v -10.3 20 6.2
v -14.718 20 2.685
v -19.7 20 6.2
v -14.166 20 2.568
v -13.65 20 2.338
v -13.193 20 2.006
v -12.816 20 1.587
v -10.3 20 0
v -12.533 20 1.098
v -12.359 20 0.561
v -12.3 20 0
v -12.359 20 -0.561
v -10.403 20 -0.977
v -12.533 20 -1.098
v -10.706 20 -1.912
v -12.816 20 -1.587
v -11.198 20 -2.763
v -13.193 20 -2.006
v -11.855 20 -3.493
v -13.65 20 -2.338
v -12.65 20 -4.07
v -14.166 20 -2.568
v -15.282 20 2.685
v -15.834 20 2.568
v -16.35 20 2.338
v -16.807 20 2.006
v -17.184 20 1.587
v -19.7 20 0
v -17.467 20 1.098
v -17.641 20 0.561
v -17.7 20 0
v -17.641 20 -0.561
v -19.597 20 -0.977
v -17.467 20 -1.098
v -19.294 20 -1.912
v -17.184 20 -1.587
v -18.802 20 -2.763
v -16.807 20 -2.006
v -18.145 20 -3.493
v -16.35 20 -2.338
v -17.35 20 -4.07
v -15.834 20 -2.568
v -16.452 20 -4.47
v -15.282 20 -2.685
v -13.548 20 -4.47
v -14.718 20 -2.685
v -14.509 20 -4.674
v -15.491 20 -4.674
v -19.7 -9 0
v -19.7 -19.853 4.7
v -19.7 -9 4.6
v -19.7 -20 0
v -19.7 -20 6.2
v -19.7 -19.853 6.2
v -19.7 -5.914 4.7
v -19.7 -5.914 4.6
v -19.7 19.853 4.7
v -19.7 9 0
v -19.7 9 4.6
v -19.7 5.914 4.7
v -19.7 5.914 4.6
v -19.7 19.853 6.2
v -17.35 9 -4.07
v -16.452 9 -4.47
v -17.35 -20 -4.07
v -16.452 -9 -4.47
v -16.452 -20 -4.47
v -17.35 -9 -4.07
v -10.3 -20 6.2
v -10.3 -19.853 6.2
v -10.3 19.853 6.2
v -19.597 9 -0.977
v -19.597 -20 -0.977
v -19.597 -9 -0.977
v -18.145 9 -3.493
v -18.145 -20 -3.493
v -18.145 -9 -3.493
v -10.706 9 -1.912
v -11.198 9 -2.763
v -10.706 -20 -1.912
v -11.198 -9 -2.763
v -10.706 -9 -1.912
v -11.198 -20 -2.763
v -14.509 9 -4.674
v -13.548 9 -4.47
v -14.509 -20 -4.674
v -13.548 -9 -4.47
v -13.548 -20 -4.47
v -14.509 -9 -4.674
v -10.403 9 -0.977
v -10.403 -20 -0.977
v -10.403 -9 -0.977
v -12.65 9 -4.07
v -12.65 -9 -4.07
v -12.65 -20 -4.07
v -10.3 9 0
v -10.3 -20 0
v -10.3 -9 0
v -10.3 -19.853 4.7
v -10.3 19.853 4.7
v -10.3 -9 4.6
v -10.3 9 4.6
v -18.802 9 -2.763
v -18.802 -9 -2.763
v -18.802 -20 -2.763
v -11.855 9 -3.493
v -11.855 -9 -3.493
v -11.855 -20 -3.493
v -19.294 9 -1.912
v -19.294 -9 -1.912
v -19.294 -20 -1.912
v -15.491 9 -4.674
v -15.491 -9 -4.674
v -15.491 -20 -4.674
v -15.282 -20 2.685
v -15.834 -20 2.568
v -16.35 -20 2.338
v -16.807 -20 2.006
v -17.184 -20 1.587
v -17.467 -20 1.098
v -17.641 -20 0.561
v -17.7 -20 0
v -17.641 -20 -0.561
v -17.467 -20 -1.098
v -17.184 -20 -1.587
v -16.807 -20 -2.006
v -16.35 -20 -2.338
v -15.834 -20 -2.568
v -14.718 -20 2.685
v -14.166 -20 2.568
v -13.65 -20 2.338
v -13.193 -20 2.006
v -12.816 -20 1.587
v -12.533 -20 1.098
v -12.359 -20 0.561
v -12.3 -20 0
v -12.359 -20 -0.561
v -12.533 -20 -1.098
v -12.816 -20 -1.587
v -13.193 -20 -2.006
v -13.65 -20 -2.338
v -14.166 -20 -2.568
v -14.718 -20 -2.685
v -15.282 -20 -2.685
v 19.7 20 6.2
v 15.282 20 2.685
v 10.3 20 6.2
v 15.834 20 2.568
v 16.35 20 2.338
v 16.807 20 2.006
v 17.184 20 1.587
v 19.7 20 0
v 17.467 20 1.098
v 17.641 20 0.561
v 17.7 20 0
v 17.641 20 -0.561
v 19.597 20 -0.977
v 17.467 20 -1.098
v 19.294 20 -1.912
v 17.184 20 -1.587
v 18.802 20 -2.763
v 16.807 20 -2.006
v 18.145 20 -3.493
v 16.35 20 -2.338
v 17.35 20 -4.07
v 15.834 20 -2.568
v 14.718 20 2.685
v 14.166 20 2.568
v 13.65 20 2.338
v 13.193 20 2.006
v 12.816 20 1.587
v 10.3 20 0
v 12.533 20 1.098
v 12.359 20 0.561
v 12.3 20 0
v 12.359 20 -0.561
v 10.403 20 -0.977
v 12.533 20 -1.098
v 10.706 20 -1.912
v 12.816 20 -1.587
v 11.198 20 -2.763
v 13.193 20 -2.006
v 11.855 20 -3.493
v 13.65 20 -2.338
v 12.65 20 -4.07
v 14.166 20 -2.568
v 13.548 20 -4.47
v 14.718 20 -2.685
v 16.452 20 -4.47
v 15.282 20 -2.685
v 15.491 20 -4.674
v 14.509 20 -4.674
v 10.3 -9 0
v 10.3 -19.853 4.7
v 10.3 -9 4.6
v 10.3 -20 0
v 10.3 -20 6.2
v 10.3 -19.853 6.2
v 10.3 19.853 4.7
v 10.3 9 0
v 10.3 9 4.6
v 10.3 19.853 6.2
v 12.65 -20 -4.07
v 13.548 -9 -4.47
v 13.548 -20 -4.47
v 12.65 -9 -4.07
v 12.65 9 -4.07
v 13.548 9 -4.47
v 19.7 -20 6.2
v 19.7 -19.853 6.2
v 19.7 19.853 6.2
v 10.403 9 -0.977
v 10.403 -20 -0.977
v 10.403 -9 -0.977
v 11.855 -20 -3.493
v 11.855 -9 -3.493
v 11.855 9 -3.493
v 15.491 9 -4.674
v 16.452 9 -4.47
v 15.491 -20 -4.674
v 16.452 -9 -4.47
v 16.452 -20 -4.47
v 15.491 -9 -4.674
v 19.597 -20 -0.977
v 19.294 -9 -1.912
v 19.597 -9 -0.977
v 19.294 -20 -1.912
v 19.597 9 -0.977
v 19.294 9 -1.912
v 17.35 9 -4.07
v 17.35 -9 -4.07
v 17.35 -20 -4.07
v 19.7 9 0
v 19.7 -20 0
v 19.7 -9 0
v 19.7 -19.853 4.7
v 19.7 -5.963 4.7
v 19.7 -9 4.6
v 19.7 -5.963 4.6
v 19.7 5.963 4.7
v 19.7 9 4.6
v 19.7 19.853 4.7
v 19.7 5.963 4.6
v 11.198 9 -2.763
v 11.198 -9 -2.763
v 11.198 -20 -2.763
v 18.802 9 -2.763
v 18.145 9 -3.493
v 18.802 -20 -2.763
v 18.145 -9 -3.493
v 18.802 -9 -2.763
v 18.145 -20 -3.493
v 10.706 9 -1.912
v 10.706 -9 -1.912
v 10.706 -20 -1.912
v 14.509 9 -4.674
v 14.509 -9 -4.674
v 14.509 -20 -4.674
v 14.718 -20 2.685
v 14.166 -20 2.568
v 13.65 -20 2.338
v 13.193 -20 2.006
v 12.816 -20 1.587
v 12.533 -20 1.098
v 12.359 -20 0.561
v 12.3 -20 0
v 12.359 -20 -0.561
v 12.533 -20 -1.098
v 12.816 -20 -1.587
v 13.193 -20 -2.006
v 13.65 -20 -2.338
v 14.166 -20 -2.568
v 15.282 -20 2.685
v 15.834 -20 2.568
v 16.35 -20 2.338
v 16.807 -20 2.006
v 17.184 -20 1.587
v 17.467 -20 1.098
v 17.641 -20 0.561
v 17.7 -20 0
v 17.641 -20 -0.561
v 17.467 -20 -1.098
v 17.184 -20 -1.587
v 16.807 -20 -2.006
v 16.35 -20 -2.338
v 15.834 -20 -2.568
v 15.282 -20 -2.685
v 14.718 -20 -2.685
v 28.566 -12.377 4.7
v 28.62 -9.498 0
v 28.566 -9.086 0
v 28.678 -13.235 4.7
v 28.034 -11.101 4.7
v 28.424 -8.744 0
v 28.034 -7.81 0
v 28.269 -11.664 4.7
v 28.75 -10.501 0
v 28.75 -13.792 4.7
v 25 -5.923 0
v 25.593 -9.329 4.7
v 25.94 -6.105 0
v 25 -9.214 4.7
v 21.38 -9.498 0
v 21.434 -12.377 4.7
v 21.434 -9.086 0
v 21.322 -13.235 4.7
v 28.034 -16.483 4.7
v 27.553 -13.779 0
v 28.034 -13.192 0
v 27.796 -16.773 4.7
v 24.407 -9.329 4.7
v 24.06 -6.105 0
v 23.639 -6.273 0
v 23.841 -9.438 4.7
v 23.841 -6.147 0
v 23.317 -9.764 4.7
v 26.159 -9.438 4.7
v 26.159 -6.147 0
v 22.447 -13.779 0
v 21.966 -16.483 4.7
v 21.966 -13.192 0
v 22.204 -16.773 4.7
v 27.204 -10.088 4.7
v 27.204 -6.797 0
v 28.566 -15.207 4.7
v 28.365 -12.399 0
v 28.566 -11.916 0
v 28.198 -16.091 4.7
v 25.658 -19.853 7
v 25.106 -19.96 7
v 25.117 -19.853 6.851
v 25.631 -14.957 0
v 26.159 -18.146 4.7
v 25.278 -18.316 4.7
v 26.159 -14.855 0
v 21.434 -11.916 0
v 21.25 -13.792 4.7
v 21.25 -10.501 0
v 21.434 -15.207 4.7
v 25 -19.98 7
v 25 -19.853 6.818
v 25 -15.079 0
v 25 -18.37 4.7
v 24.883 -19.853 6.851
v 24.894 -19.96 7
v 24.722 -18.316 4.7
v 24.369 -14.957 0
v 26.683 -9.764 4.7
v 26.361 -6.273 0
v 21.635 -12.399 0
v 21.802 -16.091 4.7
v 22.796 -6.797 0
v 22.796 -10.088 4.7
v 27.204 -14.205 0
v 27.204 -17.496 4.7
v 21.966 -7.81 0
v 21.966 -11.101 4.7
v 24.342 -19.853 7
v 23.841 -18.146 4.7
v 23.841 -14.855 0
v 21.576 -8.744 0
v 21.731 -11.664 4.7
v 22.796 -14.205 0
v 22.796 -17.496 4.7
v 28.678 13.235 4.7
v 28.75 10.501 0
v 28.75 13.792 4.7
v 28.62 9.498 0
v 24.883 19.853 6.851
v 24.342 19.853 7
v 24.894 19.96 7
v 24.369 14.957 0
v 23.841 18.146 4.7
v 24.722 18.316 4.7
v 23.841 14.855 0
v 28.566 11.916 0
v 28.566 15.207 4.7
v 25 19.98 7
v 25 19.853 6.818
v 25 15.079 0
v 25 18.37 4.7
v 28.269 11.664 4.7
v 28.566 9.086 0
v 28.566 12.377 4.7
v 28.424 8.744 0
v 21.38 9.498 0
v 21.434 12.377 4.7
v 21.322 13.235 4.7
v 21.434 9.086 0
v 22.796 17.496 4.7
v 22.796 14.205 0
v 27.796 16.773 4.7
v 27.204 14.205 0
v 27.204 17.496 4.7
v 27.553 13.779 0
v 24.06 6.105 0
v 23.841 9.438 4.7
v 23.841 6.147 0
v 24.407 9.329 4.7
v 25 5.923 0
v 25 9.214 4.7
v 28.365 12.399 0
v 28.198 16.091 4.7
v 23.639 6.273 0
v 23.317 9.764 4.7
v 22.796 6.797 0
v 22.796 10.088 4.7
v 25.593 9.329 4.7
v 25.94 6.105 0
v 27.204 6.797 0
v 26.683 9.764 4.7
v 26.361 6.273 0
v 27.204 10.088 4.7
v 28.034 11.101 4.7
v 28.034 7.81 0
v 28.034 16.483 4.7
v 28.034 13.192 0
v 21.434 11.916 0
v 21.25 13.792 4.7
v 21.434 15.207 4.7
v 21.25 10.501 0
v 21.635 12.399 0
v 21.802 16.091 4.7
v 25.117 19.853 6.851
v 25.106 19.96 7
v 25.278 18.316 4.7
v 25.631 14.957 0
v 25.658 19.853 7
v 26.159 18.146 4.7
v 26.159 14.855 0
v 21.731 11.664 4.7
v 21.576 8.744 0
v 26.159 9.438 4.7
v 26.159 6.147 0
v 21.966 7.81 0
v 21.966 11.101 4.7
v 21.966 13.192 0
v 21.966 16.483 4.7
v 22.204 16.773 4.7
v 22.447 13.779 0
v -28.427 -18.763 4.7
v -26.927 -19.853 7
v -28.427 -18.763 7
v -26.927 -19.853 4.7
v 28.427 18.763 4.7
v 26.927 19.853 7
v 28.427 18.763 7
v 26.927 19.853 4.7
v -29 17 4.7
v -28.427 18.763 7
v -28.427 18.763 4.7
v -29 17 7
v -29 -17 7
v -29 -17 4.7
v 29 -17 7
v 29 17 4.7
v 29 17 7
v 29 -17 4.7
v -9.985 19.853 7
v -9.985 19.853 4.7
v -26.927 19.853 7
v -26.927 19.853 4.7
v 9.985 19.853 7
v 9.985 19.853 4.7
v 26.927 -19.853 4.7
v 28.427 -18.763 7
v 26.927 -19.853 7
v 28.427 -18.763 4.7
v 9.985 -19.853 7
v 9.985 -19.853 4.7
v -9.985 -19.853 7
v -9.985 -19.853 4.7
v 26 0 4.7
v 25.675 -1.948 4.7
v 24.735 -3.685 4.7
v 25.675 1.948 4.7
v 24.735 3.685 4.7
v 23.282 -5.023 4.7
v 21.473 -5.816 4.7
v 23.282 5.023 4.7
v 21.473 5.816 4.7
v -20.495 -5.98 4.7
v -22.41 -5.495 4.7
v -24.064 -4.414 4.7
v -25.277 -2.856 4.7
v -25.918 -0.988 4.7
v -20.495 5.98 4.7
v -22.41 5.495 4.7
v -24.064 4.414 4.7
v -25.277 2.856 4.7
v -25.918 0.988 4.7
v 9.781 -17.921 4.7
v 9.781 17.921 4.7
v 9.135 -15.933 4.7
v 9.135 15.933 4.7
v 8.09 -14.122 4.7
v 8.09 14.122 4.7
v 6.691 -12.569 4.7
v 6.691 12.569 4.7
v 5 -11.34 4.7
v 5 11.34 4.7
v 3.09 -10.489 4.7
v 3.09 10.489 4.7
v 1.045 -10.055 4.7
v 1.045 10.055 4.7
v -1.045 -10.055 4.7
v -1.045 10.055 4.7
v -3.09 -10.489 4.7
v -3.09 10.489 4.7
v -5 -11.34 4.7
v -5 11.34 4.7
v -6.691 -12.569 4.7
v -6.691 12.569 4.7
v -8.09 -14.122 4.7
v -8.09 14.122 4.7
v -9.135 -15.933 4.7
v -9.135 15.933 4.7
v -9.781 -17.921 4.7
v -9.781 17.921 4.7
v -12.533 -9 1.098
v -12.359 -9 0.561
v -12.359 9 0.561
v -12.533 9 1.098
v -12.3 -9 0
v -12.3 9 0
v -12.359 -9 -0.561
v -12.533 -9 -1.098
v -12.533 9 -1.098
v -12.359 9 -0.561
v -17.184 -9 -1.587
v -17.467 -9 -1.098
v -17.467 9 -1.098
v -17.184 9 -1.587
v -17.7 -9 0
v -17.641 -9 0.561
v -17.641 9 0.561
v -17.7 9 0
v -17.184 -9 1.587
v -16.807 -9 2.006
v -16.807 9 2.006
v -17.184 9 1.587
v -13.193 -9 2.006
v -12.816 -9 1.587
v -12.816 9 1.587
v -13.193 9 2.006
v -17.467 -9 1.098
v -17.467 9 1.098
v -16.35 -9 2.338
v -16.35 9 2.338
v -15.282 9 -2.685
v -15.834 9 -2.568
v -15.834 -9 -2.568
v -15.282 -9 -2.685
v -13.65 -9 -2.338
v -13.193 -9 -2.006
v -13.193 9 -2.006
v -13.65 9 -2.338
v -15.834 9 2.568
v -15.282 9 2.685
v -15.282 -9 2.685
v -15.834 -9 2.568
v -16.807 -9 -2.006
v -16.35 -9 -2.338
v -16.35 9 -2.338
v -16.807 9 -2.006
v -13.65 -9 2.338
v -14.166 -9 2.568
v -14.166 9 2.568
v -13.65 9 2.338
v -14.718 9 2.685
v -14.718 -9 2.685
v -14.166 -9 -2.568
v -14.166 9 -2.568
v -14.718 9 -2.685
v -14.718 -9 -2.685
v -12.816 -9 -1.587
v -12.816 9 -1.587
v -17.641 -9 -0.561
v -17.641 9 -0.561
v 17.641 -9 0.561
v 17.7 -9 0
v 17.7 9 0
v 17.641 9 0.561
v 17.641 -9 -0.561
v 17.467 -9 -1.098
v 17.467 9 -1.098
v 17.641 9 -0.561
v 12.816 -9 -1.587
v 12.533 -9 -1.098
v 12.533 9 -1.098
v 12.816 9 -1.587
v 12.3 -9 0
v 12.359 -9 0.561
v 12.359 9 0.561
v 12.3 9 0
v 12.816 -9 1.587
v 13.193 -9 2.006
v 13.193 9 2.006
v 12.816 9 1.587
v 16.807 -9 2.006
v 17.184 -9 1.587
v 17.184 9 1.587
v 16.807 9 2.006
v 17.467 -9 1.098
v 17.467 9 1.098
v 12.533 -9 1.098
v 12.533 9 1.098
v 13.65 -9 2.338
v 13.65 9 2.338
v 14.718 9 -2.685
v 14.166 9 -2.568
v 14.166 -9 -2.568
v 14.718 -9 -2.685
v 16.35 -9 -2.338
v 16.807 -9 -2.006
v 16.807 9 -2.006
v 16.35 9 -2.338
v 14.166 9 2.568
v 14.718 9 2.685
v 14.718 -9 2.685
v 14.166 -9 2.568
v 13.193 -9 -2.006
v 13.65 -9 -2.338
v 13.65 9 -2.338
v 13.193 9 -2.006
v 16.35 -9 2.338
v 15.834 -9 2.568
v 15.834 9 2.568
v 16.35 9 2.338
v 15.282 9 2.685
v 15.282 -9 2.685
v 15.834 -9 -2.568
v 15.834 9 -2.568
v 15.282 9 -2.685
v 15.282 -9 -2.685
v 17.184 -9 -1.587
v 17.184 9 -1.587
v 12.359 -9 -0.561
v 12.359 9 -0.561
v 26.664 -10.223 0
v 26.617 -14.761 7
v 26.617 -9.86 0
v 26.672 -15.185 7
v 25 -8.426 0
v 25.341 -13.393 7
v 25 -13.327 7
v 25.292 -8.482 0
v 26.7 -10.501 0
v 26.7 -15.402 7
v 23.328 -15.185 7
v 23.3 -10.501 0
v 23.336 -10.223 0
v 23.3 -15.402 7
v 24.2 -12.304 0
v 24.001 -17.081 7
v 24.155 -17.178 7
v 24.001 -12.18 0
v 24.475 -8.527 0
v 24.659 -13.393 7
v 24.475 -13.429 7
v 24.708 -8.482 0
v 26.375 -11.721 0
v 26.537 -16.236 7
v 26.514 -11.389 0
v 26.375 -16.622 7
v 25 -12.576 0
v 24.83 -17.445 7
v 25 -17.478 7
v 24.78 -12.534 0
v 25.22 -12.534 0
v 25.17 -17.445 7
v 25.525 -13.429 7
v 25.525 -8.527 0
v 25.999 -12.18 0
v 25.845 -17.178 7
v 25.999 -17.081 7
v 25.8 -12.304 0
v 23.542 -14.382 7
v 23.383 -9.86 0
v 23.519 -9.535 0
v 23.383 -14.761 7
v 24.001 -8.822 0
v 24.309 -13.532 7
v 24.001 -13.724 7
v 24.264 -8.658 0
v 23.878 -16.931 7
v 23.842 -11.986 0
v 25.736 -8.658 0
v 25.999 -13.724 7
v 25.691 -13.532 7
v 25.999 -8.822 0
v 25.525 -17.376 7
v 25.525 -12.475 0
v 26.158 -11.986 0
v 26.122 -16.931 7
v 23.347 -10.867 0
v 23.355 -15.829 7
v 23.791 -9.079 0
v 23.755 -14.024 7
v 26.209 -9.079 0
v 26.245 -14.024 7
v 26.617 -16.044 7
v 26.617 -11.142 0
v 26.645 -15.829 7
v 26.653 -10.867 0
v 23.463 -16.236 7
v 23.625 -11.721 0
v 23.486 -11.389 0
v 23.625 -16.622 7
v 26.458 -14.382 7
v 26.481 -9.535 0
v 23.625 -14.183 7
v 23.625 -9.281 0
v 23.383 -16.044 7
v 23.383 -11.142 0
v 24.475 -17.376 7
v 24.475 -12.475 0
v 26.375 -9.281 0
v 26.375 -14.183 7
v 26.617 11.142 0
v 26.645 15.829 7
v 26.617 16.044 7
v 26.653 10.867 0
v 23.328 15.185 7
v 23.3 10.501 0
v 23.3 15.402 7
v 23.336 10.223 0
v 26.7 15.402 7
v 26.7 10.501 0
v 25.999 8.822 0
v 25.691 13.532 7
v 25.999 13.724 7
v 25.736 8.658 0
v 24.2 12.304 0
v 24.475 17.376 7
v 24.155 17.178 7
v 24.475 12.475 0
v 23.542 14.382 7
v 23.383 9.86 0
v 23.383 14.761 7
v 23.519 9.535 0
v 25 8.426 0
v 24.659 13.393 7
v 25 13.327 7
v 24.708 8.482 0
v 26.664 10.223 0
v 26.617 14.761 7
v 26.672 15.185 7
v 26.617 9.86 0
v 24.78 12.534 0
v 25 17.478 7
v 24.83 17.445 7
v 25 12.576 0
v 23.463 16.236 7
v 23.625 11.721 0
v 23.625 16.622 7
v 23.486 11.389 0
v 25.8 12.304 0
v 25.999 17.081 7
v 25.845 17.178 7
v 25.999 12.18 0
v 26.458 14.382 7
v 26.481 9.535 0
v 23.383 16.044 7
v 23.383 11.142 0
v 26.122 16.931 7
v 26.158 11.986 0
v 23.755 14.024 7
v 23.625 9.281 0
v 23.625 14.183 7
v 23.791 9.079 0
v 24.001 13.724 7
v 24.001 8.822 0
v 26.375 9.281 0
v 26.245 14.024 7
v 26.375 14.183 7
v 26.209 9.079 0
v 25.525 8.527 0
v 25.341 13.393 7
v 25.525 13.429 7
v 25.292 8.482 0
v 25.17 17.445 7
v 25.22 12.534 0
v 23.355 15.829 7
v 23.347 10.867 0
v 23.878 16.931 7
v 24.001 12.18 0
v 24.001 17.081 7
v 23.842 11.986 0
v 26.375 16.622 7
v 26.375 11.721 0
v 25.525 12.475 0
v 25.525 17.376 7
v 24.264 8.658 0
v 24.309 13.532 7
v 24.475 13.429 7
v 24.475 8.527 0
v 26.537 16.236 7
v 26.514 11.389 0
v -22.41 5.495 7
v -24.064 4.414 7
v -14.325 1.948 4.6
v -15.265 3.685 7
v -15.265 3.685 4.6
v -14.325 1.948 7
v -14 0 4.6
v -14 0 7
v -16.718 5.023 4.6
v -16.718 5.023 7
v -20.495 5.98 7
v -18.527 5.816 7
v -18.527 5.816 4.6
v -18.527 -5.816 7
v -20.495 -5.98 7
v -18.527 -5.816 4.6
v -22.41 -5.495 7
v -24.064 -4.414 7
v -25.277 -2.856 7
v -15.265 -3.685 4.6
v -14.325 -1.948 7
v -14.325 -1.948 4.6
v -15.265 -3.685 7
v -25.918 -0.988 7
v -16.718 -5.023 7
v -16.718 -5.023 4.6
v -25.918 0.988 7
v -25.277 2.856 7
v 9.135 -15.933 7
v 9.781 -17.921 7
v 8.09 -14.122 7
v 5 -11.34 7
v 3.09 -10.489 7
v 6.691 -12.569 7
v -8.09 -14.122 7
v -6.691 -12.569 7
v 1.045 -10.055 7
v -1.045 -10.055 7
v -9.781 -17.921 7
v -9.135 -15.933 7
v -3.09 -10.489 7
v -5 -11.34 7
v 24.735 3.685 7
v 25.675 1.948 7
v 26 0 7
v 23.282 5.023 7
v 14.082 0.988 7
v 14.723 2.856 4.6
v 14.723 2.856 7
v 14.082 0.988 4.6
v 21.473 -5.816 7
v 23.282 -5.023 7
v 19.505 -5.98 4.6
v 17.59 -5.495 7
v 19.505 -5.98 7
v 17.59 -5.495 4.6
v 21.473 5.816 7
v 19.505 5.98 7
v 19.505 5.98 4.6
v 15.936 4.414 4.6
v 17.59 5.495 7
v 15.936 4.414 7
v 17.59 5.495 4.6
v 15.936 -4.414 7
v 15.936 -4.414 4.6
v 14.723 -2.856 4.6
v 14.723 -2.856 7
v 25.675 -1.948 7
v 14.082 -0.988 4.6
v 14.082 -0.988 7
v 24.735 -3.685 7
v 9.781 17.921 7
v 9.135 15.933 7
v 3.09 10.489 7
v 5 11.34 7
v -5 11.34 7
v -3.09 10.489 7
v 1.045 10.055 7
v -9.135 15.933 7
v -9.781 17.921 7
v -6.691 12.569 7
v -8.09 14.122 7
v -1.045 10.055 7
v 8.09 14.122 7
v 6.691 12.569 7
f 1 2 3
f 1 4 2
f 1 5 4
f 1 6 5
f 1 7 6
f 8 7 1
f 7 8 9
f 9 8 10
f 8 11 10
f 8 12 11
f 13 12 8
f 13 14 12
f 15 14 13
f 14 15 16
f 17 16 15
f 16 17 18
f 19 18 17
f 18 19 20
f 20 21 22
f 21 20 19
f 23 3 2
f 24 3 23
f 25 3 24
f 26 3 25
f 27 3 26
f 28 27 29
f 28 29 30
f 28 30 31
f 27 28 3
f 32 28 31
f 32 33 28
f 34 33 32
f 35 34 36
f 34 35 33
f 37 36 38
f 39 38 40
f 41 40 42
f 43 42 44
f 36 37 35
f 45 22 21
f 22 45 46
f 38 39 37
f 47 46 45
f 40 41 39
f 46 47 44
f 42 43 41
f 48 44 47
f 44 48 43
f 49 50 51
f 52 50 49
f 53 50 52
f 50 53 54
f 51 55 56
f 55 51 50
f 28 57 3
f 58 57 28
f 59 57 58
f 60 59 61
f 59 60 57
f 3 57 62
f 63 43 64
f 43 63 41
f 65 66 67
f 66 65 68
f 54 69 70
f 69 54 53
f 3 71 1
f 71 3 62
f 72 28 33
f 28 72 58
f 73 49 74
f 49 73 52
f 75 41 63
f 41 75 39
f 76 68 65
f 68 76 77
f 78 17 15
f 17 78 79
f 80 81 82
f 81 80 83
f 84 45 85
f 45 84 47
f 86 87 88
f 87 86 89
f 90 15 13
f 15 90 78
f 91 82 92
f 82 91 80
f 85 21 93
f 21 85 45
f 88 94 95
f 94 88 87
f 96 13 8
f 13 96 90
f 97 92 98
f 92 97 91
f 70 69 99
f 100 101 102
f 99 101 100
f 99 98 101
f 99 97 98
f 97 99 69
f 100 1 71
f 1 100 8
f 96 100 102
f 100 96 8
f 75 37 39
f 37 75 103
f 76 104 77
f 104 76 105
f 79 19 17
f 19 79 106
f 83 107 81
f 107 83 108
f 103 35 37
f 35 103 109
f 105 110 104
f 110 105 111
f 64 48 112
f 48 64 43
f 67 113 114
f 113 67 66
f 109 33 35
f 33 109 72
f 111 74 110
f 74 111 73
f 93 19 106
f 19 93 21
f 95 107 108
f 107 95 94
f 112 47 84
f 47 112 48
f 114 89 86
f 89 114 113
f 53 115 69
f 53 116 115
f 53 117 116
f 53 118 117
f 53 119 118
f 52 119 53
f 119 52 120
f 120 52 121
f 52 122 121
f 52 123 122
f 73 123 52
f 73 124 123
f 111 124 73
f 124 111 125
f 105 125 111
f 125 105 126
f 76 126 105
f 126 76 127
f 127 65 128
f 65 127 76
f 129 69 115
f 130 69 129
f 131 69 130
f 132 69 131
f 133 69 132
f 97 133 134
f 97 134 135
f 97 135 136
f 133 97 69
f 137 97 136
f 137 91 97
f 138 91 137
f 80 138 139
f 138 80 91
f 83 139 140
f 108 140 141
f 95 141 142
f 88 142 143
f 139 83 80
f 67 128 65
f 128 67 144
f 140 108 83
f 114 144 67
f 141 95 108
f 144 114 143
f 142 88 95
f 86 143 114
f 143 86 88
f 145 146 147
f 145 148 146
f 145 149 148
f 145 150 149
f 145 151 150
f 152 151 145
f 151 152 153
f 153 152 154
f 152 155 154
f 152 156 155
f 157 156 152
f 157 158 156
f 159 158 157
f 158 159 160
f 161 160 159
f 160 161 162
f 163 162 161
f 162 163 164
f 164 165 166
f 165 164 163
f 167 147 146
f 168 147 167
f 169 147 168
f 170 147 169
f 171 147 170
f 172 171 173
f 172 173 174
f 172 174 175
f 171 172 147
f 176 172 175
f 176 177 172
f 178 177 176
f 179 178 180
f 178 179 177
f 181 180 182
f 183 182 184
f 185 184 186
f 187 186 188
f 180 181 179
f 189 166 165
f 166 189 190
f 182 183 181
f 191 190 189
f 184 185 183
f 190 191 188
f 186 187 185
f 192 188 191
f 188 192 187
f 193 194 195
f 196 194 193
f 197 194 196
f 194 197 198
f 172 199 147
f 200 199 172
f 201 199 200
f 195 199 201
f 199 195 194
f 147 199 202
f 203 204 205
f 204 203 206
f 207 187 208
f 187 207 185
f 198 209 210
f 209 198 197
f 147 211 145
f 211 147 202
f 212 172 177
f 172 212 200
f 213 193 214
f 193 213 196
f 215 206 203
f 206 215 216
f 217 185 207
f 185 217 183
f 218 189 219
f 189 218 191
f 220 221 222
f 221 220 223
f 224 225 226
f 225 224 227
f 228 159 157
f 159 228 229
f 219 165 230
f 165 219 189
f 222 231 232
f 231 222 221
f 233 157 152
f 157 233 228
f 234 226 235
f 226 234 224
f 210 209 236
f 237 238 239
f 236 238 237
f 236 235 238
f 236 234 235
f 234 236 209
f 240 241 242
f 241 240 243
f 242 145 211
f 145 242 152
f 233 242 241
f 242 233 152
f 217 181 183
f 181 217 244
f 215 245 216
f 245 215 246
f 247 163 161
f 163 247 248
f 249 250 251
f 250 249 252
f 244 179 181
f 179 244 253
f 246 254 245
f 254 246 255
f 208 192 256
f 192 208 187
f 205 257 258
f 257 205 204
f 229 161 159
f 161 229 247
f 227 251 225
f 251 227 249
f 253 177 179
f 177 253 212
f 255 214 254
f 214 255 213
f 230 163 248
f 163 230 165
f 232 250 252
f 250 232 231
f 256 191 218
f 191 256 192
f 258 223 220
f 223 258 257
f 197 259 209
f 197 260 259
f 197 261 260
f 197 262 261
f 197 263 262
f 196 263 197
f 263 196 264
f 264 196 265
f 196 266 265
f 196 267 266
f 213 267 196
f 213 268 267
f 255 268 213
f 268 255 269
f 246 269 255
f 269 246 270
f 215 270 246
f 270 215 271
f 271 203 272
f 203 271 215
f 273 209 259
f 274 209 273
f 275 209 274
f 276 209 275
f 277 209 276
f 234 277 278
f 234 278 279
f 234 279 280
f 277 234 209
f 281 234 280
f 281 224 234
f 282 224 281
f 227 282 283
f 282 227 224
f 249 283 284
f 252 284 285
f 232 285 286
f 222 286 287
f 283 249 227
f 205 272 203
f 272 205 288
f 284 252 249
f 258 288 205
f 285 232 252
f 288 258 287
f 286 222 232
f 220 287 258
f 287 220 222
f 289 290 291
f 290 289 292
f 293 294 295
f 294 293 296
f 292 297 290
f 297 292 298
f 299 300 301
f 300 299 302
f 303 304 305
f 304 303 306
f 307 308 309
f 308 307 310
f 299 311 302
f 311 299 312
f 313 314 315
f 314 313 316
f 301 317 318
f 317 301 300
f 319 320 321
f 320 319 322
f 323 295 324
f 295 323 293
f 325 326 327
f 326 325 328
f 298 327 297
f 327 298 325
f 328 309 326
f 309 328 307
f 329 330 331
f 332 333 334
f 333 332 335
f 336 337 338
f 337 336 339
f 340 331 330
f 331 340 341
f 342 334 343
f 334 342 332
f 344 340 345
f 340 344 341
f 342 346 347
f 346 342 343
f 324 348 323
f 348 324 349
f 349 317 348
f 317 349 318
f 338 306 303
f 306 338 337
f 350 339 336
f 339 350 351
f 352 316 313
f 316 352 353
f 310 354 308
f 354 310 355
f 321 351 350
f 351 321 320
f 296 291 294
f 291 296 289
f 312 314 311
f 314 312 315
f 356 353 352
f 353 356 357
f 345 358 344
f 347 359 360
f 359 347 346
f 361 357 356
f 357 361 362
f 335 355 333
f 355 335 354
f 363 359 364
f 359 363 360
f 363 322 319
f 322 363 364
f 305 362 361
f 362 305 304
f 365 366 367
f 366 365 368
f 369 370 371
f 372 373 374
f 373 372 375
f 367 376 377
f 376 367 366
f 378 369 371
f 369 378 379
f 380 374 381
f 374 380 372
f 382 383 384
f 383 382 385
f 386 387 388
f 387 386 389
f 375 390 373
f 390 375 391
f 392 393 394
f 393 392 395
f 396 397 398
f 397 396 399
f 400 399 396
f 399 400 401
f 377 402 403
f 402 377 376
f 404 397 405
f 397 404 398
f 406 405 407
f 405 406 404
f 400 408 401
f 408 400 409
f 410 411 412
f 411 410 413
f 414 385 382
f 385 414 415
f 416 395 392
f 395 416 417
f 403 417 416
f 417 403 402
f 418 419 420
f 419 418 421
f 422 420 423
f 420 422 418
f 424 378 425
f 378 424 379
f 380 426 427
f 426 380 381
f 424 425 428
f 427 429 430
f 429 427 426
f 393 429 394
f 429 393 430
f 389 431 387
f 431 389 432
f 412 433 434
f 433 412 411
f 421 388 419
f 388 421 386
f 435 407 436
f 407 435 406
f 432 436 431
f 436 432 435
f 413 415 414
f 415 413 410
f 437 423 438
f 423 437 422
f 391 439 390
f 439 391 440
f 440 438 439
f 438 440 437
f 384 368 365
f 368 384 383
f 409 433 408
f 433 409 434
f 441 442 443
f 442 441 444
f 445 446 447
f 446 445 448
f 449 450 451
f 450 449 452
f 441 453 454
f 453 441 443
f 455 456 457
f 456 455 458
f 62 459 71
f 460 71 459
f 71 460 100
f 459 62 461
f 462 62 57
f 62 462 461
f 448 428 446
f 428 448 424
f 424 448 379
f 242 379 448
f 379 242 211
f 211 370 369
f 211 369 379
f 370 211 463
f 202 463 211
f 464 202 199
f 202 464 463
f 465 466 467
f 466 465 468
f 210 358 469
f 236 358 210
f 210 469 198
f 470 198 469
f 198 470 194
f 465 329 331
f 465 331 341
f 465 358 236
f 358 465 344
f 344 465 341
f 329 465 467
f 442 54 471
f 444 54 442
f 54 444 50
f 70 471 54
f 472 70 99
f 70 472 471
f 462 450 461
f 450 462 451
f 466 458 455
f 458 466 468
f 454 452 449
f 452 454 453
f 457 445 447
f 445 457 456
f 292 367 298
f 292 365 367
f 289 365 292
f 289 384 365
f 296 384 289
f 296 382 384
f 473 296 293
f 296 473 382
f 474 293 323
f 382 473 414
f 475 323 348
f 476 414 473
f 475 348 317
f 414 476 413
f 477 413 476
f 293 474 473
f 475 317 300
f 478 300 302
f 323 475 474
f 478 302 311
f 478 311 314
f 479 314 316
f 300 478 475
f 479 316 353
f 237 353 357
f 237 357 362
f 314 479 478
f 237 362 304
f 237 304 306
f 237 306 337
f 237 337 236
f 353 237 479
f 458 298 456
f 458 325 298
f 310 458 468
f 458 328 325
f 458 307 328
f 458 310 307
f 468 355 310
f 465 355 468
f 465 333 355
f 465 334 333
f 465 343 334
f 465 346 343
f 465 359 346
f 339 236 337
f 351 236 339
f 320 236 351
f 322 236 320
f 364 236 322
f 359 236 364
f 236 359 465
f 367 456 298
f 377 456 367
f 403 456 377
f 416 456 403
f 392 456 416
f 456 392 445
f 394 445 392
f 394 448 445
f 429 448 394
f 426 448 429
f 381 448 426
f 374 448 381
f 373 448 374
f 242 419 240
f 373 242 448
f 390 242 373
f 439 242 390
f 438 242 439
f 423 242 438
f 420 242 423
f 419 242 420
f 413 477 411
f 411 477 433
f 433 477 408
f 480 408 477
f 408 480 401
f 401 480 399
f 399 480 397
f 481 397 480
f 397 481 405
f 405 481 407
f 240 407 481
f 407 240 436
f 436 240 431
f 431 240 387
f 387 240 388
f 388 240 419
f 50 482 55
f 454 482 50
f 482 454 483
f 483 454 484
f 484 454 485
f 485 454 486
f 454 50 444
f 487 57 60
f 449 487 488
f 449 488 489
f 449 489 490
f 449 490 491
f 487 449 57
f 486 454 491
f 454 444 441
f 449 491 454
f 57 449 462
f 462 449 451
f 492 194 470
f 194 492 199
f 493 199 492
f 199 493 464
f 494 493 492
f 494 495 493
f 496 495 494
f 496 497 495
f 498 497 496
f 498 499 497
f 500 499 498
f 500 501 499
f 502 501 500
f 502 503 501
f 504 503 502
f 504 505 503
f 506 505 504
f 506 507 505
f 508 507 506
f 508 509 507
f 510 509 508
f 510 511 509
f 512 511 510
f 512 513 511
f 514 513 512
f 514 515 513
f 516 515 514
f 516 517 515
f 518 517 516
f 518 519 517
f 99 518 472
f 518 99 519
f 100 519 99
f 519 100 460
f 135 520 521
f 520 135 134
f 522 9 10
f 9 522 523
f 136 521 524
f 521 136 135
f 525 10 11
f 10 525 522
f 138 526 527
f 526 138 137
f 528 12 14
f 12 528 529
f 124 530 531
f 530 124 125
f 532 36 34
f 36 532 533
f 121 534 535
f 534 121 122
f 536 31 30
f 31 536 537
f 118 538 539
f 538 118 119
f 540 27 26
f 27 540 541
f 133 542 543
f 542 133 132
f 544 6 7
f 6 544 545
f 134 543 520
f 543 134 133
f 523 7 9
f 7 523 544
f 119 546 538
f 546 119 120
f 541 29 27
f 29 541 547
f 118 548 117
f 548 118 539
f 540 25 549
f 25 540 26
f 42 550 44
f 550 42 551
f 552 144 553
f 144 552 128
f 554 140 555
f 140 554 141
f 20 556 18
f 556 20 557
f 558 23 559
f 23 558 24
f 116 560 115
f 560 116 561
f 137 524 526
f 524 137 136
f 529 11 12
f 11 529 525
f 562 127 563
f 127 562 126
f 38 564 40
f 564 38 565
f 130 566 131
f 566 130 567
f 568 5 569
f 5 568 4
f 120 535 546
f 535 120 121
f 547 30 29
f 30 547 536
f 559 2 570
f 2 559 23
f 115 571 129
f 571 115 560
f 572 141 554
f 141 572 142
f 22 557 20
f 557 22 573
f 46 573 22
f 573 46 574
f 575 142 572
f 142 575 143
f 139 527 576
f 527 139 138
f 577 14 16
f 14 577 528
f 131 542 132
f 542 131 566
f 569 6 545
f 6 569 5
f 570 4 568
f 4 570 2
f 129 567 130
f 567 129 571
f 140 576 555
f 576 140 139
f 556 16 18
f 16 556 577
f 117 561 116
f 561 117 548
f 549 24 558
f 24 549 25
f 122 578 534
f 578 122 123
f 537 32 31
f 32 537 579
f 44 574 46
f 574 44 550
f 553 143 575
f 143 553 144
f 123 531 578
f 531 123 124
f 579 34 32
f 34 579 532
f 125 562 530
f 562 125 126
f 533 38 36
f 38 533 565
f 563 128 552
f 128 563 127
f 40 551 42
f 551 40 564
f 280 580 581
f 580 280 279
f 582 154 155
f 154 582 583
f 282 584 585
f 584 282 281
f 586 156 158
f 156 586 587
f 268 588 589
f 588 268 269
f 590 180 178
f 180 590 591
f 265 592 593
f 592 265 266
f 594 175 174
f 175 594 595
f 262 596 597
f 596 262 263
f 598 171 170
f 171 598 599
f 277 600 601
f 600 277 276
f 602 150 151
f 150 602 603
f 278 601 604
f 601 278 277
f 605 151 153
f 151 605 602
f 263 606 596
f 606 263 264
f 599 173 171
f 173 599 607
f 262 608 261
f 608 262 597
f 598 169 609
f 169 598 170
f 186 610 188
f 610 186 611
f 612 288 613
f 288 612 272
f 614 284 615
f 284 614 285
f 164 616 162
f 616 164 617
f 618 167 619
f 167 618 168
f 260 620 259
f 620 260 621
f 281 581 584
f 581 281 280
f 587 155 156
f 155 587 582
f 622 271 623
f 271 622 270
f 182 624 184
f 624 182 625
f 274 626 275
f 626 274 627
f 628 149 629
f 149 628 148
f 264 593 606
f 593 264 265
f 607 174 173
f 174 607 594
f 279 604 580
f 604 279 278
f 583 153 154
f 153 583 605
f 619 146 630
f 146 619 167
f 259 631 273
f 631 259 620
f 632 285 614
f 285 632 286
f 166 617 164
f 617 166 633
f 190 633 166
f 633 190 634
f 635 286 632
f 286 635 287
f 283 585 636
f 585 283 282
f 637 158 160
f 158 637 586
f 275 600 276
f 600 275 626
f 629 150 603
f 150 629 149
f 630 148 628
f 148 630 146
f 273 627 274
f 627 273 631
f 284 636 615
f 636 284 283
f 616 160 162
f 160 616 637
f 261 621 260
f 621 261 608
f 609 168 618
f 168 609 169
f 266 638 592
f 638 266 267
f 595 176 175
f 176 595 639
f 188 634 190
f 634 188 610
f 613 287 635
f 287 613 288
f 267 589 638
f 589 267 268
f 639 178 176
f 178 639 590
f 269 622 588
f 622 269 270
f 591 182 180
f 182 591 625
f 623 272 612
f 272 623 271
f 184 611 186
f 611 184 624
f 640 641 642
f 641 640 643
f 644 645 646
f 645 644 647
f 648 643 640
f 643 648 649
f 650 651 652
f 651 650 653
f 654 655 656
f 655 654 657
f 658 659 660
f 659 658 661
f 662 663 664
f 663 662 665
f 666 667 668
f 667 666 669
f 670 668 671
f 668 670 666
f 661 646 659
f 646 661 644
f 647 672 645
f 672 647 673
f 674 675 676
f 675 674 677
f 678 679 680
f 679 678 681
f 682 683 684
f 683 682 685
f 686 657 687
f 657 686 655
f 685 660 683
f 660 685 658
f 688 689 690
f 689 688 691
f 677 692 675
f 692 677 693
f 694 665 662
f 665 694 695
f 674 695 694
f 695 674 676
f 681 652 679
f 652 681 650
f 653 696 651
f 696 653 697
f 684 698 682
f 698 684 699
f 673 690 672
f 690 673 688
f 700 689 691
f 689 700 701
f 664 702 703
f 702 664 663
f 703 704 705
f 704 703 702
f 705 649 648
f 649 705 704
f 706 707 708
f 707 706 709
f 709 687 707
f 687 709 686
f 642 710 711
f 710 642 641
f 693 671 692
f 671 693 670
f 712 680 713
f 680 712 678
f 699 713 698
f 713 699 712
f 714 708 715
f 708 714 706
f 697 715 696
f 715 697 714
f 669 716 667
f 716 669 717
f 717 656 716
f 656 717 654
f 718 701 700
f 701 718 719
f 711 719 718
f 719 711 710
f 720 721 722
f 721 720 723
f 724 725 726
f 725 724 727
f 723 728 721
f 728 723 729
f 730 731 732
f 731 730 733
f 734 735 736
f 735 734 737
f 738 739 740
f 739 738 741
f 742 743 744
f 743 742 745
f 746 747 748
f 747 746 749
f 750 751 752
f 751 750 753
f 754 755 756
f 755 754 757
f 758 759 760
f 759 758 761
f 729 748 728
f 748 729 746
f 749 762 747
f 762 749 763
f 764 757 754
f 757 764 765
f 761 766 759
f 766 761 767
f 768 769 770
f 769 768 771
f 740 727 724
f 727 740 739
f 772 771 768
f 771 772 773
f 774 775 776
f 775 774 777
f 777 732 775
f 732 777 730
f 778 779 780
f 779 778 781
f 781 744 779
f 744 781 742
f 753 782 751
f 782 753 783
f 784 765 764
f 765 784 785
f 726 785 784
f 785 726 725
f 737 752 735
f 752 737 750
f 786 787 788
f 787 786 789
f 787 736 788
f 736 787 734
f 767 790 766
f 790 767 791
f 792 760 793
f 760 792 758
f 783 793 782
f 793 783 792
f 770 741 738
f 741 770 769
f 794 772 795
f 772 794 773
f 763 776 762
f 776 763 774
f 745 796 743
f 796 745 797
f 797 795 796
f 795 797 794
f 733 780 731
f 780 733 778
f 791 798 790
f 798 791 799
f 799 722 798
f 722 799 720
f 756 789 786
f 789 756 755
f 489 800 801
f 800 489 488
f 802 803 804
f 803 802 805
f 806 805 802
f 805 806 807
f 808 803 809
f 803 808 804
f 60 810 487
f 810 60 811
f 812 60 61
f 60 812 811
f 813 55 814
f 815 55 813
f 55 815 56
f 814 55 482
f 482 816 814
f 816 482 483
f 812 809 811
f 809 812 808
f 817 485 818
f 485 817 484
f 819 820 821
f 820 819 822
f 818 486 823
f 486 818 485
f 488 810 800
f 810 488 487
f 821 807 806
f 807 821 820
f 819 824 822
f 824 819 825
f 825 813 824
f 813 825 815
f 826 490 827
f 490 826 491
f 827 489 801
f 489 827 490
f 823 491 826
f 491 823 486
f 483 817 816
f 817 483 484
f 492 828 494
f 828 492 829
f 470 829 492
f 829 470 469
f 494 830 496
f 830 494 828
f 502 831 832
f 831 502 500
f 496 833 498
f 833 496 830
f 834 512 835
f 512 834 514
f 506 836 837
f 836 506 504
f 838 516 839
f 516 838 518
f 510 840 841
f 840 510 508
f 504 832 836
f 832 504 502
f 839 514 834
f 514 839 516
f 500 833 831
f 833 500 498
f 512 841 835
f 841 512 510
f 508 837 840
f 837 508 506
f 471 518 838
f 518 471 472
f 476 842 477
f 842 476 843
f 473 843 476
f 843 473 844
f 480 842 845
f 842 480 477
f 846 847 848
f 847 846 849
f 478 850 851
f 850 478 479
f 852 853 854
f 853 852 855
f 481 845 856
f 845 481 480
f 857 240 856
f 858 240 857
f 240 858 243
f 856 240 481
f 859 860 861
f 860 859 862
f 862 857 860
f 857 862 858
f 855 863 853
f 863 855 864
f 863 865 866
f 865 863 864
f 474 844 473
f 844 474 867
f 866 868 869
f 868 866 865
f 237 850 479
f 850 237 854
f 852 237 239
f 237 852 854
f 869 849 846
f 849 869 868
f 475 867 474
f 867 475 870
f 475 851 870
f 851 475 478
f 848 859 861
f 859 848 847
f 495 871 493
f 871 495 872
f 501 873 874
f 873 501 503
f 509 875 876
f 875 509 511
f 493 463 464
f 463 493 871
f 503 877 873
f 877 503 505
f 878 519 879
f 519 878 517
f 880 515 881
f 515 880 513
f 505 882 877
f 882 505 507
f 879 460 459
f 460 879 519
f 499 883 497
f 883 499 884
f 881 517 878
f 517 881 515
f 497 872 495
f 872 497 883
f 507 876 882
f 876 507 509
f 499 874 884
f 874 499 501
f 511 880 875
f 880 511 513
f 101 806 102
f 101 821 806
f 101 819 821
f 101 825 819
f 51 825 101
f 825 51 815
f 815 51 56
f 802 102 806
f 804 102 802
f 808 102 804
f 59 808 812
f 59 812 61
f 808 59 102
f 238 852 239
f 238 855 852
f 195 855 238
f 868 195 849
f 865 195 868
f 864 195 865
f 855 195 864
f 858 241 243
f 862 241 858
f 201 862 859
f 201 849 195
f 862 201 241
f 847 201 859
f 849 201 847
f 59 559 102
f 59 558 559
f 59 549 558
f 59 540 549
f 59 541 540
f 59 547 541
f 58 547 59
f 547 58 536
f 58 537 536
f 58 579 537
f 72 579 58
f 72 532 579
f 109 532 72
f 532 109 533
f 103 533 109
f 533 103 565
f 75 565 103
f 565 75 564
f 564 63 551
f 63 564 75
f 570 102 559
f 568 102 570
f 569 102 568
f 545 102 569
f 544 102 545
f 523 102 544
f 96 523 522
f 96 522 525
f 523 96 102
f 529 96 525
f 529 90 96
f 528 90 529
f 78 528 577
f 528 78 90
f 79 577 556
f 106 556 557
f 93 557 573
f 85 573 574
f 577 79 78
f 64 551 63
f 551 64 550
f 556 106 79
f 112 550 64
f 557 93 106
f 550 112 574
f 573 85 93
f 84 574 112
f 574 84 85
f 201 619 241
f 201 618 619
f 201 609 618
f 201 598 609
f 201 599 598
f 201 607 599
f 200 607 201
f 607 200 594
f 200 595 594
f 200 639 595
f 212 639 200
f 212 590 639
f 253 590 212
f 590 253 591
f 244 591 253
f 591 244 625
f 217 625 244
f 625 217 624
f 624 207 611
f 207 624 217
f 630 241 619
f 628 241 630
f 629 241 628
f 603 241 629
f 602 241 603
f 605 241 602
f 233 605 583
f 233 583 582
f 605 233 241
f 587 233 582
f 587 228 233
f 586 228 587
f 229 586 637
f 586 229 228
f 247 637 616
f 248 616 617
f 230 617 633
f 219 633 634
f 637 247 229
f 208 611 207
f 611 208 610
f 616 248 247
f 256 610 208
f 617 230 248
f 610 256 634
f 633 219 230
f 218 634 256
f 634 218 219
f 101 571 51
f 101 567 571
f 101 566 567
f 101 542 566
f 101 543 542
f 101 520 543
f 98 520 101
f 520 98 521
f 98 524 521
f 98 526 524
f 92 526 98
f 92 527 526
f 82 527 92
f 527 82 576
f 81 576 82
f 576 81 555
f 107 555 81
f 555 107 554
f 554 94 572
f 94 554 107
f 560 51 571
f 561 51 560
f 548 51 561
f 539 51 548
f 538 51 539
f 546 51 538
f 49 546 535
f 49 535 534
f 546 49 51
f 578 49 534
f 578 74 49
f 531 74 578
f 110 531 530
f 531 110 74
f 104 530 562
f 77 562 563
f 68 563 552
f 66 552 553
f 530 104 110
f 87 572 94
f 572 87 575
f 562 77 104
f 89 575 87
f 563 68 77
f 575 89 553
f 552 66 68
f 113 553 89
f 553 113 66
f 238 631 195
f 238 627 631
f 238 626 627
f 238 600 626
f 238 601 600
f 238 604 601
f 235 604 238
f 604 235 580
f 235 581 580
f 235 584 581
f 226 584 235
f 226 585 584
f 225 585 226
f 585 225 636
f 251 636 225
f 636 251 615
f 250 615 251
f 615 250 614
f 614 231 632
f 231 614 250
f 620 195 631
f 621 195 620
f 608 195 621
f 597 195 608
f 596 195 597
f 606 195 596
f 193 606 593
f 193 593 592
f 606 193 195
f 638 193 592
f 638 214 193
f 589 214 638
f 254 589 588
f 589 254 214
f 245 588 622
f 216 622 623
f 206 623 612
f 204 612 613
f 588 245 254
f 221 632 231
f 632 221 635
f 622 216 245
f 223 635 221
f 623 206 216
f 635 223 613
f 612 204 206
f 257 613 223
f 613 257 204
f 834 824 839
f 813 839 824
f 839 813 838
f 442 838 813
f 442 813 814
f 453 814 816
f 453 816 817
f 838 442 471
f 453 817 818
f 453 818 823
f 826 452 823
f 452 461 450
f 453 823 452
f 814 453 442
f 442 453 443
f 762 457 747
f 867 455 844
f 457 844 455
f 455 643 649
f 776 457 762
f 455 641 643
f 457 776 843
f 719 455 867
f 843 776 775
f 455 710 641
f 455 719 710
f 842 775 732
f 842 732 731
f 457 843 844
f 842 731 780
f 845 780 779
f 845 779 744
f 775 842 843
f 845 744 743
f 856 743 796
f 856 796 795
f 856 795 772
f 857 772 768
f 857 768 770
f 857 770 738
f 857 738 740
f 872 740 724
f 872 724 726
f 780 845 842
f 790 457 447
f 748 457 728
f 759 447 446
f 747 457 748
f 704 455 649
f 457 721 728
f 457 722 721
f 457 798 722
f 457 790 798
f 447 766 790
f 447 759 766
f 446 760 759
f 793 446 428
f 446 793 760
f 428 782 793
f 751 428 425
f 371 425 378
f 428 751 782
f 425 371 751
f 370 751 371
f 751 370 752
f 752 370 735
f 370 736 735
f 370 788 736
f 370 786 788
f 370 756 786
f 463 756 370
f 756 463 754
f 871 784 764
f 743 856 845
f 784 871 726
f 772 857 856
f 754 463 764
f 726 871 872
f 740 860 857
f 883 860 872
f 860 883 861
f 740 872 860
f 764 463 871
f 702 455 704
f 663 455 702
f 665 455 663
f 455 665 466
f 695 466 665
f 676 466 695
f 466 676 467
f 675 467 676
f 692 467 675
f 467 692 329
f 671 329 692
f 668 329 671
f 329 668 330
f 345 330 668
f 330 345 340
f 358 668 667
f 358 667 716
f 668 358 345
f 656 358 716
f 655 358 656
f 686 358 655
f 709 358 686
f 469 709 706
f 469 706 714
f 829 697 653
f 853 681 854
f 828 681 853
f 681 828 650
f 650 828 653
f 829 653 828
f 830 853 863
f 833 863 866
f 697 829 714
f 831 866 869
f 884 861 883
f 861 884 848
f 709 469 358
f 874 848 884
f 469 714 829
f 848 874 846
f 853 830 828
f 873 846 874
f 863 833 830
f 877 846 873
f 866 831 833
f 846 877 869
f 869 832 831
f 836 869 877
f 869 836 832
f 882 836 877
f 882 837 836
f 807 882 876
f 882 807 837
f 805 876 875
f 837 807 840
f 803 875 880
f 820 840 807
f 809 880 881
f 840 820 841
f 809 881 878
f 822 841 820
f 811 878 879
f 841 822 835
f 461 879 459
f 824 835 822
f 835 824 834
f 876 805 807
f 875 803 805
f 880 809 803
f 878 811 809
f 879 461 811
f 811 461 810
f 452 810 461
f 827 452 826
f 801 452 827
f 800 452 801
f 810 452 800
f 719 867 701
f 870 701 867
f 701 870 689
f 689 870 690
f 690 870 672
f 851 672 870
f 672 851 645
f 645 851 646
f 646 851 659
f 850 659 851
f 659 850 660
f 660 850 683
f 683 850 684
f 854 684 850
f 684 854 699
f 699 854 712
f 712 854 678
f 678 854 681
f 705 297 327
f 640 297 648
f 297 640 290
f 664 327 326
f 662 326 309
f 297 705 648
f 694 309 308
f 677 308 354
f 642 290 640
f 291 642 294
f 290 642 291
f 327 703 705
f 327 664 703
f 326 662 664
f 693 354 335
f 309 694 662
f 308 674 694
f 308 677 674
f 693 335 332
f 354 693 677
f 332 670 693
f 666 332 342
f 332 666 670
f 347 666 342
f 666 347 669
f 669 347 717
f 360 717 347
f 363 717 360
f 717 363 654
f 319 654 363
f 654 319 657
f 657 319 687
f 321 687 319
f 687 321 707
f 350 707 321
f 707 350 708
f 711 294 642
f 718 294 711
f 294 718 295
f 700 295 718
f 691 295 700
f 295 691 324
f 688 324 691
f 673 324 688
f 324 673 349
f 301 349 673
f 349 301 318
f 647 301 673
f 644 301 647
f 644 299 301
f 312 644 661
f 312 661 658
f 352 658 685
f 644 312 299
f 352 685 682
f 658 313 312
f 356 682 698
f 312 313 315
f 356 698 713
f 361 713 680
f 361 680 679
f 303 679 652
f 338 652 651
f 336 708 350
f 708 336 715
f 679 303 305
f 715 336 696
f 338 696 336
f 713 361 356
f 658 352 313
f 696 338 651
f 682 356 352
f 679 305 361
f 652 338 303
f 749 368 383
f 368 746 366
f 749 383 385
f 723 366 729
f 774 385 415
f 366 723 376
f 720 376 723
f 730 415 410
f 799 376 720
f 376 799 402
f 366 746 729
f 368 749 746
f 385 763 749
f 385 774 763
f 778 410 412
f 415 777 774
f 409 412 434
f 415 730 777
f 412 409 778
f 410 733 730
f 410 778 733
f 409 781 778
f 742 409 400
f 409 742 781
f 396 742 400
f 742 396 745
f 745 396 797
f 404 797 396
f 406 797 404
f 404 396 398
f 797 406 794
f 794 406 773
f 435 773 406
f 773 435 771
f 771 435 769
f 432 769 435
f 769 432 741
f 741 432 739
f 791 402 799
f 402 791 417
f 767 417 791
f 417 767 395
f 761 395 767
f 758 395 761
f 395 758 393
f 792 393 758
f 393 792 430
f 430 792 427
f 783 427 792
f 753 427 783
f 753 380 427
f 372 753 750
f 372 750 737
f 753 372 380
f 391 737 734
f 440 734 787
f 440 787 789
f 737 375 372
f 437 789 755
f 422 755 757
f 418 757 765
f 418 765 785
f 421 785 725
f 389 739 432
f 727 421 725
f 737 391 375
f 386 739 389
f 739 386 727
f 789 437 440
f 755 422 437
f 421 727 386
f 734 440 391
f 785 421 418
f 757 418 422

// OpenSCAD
// file: dronePlates.scad
/**
 * dronePlates.scad
 * Plate library
 *
 * GNU GPL V3
 * @author: Victor Potenciano
 */

m3Rad = 3.4/2;
cornerR = 4;

/**
 *
 */
module helperDisk(diameter) {
	cylinder(r = diameter/2, h = 0.6, $fn=20);
}

/**
 *
 */
module roundedRect(size, radius) {
	x = size[0];
	y = size[1];
	z = size[2];

	linear_extrude(height=z)
	hull() {
	// place 4 circles in the corners, with the given radius
	translate([(-x/2)+(radius/2), (-y/2)+(radius/2), 0]){ circle(r=radius); }
	translate([(x/2)-(radius/2), (-y/2)+(radius/2), 0]){ circle(r=radius); }
	translate([(-x/2)+(radius/2), (y/2)-(radius/2), 0]){ circle(r=radius); }
	translate([(x/2)-(radius/2), (y/2)-(radius/2), 0]){ circle(r=radius); }
	}
}

/**
 * rounded rectangle triangle with corner at origin
 */
module roundedTriangle(size, radius) {
	x = size[0];
	y = size[1];
	z = size[2];

	linear_extrude(height=z)
	hull() {
	translate([radius, radius, 0]){ circle(r=radius); }
	translate([x-radius, radius, 0]){ circle(r=radius); }
	translate([radius, y-radius, 0]){ circle(r=radius); }
	}
}

/**
 *
 */
module roundRectPlate(w, l, plateThick=3) {
	difference(){
		roundedRect([l+m3Rad*1.75,w+m3Rad*1.75,plateThick], cornerR);
		translate([l/2, w/2, -0.5]) { cylinder(h = plateThick+1, r = m3Rad, $fn=30); }
		translate([-l/2, w/2, -0.5]) { cylinder(h = plateThick+1, r = m3Rad, $fn=30); }
		translate([l/2, -w/2, -0.5]) { cylinder(h = plateThick+1, r = m3Rad, $fn=30); }
		translate([-l/2, -w/2, -0.5]) { cylinder(h = plateThick+1, r = m3Rad, $fn=30); }
	}
}

/**
 *
 */
module crossSquarePlate(l, thick=3) {
	inDist = cornerR*2+4;
	trianL = sqrt((l*l)/2)-inDist;
	centerR = 4;

	difference(){
		roundRectPlate(l, l, thick);
		translate([0, centerR, -0.5]) { 
			rotate([0,0,45]){ roundedTriangle([trianL,trianL,thick+1], cornerR-2); }
		}
		translate([0, -centerR, -0.5]) { 
			rotate([0,0,225]){ roundedTriangle([trianL,trianL,thick+1], cornerR-2); }
		}
		translate([-centerR, 0, -0.5]) { 
			rotate([0,0,135]){ roundedTriangle([trianL,trianL,thick+1], cornerR-2); }
		}
		translate([centerR, 0, -0.5]) { 
			rotate([0,0,-45]){ roundedTriangle([trianL,trianL,thick+1], cornerR-2); }
		}
	}
}

/**
 *
 */
module hShapePlate(w, l, thick=4) {
	inDist = cornerR*2+1;

	difference(){
		roundRectPlate(w, l, thick);
		translate([0, w/4, -0.5]) { roundedRect([l-inDist,w/2-inDist,thick+1], cornerR-2); }
		translate([0, -w/4, -0.5]) { roundedRect([l-inDist,w/2-inDist,thick+1], cornerR-2); }
	}
}

/**
 *
 */
module motorCircleMount(inDia, outDia, thick=3, extraH=false, d1=19, d2=16, holeR=m3Rad ) {
	difference(){
		cylinder(h = thick, r = outDia/2, $fn=30);
		motorCircleMountHoles(inDia, outDia, thick, extraH, d1=d1, d2=d2, holeR=holeR);
	}
}

/**
 *
 */
module motorCircleMountHoles(inDia, outDia, thick=3, extraH=false, d1=19, d2=16, d3=25, holeR=m3Rad) {
	translate([0, 0, -0.5]) { cylinder(h = thick+1, r = inDia/2, $fn=30); }

	for(i=[0:3]) {
		rotate([0,0,90*i]){
		translate([d1/2, 0, -0.5]) cylinder(h = thick+1, r = holeR, $fn=20);
		translate([d2/2, 0, -0.5]) cylinder(h = thick+1, r = holeR, $fn=20);
		translate([d2/2, -holeR, -0.5]) cube(size = [(d1-d2)/2,holeR*2,thick+1]);
		}
	}
	
	if(extraH==true){	
		for(i=[-1,1]) translate([i*d3/2, 0, -0.5]) { cylinder(h = thick+1, r = holeR, $fn=30); }
	}
}

/**
 *
 */
module motorRectMount(w, l, inDia, thick=3) {
	d1=19;
	d2=16;

	difference(){
		roundRectPlate(w, l, thick);
		translate([0, 0, -0.5]) { cylinder(h = thick+1, r = inDia/2, $fn=30); }
		translate([0, d1/2, -0.5]) { cylinder(h = thick+1, r = m3Rad, $fn=30); }
		translate([0, -d1/2, -0.5]) { cylinder(h = thick+1, r = m3Rad, $fn=30); }
		translate([d2/2, 0, -0.5]) { cylinder(h = thick+1, r = m3Rad, $fn=30); }
		translate([-d2/2, 0, -0.5]) { cylinder(h = thick+1, r = m3Rad, $fn=30); }
	}
}

/**
 *
 */
module tube(inDia, outDia, height) {
	difference(){
		cylinder(h = height, r = outDia/2, $fn=50);
		translate([0, 0, -0.5]) { cylinder(h = height+1, r = inDia/2, $fn=30); }
	}
}

/**
 *
 */
module squareTube(inDia, outDia, height) {
	translate([0,0,height/2]){
	difference(){
		cube(size = [outDia,outDia,height], center = true);
		cube(size = [inDia,inDia,height+1], center = true);
	}
	}
}

/**
 *
 */
module djiFlamewheelHoles(height) {
	a = 23;
	b = 16;
	c = 19.5;
	
	translate([a/2, c/2, 0]) { cylinder(h = height, r = m3Rad, $fn=30); }
	translate([-a/2, c/2, 0]) { cylinder(h = height, r = m3Rad, $fn=30); }
	translate([b/2, -c/2, 0]) { cylinder(h = height, r = m3Rad, $fn=30); }
	translate([-b/2, -c/2, 0]) { cylinder(h = height, r = m3Rad, $fn=30); }
}

/**
 *
 */
module djiFlamewheelHolesBotton(height) {
	a1 = 21;
	c = 19.5;
	
	translate([a1/2, c/2, 0]) { cylinder(h = height, r = m3Rad, $fn=30); }
	translate([-a1/2, c/2, 0]) { cylinder(h = height, r = m3Rad, $fn=30); }
}

/**
 *
 */
module propeller(size){
union(){
difference(){
	cylinder(h = 3, r = size/2, center=true, $fn=30);
	cylinder(h = 3.1, r = size/2-2, center=true, $fn=30); 
}
for( i = [-1,1] ){
rotate([0,0,45*i]){ cube(size = [size,4,1], center = true); }
}
}
}

/**
 *
 */
module slot(length, height, rad){
for(i=[-1,1]) translate([i*length/2,0,0]) cylinder(h = height, r = rad, $fn=30);
translate([0,0,height/2]) cube(size = [length,rad*2,height], center = true);
}

 

////////////////////////
// Examples:
////////////////////////

motorCircleMount(8, 25, 3.5);

//roundedRect([50,50,3], 4);

//hShapePlate(79, 25);

//rotate([0,0,45]){roundedTriangle([40,40,3], 4);}

//crossSquarePlate(45, 4);

/*
union(){
motorRectMount(21, 18, 8, 4);
translate([9, 10.5, 0]) {tube(m3Rad*2, 6.5, 6);}
}
*/

/*
difference(){
union(){
hShapePlate(50, 30, 3.5);
translate([-4,-25,0]){cube(size = [8,50,3.5]);}
rotate([0, 0, 45]) {motorCircleMount(8, 35, 3.5);}
}
cylinder(h = 10, r = 4, $fn=100, center=true);
}
*/

//rotate([90,0,0]){ tube(5,10,20); }
//translate([20,0,0]){ squareTube(5, 10, 20); }
// main file
/**
 * krieger mobius mount
 */
 
 use <dronePlates.scad>
 
 m3Rad = 3.4/2;
 spacerDia = 5.4;
 angle2 = 70;
 
 difference(){
 union(){
 translate([0,0,(spacerDia+4)/2]) roundedRect([55,37,3],3);
 for(i=[-1,1]) translate([i*30/2,0,0]){
     hull(){
     rotate([90,0,0]) cylinder(r=(spacerDia+4)/2, h=40, $fn=30, center=true);
     translate([0,0,(spacerDia+4)/2]) cube(size=[spacerDia+4,40,3],center=true);
     }
 }
 
for(i=[-1,1]){
translate([25,i*14/2,-5]) rotate([-i*angle2/2,0,0]) cylinder(r=7.5/2, h=19, $fn=20);
}
}
 
 for(i=[-1,1]) translate([i*30/2,0,0]){rotate([90,0,0]) cylinder(r=spacerDia/2, h=41, $fn=30, center=true);}
 
 translate([0,0,-0.4]) cube(size=[40,18,10], center=true);

//antenna 
for(i=[-1,1]){
translate([25,i*14/2,-5]) rotate([-i*angle2/2,0,0]) cylinder(r=m3Rad, h=90, $fn=20,center=true);
}

for(i=[-1,1]){
    translate([i*20,0,0]) cylinder(r=6,h=20,center=true);
    translate([0,i*40/2,0]) cylinder(r=10,h=20,center=true);
}
 
translate([0,0,12]) cube(size=[100,100,10], center=true);
translate([25,0,-5]) cube(size=[10,100,10], center=true);
}//diff
